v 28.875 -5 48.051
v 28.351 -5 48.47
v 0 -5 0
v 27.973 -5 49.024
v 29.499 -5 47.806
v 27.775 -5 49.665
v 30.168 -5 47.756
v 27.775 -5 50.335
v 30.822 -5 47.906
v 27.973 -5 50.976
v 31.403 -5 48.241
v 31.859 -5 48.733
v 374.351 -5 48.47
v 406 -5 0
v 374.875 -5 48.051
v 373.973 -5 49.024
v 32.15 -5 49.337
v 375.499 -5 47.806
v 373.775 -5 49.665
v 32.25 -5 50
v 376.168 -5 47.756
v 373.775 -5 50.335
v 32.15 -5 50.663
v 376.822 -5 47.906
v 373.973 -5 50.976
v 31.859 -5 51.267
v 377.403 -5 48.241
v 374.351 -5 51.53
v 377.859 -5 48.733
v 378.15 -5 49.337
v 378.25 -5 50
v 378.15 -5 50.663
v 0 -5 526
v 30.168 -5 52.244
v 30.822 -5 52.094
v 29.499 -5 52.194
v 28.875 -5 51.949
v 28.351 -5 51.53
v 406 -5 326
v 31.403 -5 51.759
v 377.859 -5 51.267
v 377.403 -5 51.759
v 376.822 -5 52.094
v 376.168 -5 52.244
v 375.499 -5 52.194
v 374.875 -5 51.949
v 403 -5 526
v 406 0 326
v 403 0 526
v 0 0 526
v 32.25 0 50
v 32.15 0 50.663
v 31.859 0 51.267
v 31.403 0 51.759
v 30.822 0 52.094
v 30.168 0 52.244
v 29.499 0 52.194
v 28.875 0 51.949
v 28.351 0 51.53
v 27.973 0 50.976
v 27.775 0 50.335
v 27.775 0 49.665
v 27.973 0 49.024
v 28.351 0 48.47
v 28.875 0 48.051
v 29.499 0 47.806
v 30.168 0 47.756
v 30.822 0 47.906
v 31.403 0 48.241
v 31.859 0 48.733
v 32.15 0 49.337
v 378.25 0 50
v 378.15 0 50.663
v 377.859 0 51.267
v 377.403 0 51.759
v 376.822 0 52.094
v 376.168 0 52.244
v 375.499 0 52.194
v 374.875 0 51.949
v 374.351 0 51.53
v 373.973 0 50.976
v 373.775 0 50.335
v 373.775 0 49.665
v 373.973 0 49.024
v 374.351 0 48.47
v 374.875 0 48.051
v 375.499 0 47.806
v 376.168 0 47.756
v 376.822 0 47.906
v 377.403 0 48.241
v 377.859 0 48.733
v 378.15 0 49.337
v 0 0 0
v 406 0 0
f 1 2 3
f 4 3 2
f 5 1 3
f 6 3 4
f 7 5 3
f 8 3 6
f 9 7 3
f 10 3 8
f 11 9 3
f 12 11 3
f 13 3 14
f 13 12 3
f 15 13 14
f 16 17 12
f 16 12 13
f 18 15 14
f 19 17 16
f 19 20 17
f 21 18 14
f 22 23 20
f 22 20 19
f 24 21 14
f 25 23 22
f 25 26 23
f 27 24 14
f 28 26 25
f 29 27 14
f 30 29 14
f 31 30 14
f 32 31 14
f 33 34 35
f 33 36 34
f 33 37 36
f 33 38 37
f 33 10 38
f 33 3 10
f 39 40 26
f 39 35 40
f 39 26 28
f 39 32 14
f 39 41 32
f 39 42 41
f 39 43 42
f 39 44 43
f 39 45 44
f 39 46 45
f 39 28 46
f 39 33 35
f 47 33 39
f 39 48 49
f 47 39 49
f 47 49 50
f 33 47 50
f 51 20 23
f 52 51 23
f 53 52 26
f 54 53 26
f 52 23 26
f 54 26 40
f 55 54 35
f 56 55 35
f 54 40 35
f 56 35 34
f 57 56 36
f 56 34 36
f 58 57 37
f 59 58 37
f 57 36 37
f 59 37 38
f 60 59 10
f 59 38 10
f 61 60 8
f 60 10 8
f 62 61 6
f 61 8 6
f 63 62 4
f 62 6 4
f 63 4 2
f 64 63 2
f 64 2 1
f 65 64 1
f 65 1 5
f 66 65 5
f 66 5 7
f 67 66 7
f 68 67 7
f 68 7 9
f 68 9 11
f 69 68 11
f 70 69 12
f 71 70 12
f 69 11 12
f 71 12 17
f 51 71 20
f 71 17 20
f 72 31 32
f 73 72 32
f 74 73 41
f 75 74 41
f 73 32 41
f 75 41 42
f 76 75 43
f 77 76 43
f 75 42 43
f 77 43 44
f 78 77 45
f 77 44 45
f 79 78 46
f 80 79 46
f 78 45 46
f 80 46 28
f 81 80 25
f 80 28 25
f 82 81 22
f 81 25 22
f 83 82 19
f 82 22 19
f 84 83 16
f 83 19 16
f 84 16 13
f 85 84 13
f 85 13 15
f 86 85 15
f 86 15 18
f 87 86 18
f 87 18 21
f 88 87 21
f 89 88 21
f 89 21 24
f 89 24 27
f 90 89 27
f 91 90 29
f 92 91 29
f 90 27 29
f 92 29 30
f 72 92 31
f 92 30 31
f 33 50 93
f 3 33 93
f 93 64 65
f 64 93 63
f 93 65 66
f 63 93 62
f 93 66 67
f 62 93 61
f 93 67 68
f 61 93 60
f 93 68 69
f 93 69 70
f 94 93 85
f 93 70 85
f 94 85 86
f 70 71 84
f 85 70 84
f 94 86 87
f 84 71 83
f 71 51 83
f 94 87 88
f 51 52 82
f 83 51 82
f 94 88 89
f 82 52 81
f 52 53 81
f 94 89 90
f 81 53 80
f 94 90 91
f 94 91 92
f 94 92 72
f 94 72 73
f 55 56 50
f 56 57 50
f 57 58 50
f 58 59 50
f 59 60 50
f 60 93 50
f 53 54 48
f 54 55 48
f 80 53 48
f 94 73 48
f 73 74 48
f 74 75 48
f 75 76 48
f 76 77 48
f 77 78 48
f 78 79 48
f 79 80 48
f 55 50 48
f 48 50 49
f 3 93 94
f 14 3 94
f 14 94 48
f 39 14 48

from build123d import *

# Parameters (mm, degrees)
F1_DEPTH = 5
F2_R     = 2.25
F3_DEPTH = 5


# Not quite as in the source:
# - a feature names something its author has since deleted; it is built from what else it names


with BuildPart() as f1:
    # F0 (on Front) → F1 (new body)
    with BuildSketch(Plane.XZ):
        Polygon((0, 526), (0, 0), (406, 0), (406, 326), (403, 526), align=None)
    extrude(amount=F1_DEPTH)

    # F2 (on face) → F3 (cut, through all)
    with BuildSketch(Plane.XZ.offset(5)):
        with Locations((30, 50)):
            Circle(F2_R)
        with Locations((376, 50)):
            Circle(F2_R)
    extrude(amount=-F3_DEPTH, mode=Mode.SUBTRACT)


solid = f1.part
